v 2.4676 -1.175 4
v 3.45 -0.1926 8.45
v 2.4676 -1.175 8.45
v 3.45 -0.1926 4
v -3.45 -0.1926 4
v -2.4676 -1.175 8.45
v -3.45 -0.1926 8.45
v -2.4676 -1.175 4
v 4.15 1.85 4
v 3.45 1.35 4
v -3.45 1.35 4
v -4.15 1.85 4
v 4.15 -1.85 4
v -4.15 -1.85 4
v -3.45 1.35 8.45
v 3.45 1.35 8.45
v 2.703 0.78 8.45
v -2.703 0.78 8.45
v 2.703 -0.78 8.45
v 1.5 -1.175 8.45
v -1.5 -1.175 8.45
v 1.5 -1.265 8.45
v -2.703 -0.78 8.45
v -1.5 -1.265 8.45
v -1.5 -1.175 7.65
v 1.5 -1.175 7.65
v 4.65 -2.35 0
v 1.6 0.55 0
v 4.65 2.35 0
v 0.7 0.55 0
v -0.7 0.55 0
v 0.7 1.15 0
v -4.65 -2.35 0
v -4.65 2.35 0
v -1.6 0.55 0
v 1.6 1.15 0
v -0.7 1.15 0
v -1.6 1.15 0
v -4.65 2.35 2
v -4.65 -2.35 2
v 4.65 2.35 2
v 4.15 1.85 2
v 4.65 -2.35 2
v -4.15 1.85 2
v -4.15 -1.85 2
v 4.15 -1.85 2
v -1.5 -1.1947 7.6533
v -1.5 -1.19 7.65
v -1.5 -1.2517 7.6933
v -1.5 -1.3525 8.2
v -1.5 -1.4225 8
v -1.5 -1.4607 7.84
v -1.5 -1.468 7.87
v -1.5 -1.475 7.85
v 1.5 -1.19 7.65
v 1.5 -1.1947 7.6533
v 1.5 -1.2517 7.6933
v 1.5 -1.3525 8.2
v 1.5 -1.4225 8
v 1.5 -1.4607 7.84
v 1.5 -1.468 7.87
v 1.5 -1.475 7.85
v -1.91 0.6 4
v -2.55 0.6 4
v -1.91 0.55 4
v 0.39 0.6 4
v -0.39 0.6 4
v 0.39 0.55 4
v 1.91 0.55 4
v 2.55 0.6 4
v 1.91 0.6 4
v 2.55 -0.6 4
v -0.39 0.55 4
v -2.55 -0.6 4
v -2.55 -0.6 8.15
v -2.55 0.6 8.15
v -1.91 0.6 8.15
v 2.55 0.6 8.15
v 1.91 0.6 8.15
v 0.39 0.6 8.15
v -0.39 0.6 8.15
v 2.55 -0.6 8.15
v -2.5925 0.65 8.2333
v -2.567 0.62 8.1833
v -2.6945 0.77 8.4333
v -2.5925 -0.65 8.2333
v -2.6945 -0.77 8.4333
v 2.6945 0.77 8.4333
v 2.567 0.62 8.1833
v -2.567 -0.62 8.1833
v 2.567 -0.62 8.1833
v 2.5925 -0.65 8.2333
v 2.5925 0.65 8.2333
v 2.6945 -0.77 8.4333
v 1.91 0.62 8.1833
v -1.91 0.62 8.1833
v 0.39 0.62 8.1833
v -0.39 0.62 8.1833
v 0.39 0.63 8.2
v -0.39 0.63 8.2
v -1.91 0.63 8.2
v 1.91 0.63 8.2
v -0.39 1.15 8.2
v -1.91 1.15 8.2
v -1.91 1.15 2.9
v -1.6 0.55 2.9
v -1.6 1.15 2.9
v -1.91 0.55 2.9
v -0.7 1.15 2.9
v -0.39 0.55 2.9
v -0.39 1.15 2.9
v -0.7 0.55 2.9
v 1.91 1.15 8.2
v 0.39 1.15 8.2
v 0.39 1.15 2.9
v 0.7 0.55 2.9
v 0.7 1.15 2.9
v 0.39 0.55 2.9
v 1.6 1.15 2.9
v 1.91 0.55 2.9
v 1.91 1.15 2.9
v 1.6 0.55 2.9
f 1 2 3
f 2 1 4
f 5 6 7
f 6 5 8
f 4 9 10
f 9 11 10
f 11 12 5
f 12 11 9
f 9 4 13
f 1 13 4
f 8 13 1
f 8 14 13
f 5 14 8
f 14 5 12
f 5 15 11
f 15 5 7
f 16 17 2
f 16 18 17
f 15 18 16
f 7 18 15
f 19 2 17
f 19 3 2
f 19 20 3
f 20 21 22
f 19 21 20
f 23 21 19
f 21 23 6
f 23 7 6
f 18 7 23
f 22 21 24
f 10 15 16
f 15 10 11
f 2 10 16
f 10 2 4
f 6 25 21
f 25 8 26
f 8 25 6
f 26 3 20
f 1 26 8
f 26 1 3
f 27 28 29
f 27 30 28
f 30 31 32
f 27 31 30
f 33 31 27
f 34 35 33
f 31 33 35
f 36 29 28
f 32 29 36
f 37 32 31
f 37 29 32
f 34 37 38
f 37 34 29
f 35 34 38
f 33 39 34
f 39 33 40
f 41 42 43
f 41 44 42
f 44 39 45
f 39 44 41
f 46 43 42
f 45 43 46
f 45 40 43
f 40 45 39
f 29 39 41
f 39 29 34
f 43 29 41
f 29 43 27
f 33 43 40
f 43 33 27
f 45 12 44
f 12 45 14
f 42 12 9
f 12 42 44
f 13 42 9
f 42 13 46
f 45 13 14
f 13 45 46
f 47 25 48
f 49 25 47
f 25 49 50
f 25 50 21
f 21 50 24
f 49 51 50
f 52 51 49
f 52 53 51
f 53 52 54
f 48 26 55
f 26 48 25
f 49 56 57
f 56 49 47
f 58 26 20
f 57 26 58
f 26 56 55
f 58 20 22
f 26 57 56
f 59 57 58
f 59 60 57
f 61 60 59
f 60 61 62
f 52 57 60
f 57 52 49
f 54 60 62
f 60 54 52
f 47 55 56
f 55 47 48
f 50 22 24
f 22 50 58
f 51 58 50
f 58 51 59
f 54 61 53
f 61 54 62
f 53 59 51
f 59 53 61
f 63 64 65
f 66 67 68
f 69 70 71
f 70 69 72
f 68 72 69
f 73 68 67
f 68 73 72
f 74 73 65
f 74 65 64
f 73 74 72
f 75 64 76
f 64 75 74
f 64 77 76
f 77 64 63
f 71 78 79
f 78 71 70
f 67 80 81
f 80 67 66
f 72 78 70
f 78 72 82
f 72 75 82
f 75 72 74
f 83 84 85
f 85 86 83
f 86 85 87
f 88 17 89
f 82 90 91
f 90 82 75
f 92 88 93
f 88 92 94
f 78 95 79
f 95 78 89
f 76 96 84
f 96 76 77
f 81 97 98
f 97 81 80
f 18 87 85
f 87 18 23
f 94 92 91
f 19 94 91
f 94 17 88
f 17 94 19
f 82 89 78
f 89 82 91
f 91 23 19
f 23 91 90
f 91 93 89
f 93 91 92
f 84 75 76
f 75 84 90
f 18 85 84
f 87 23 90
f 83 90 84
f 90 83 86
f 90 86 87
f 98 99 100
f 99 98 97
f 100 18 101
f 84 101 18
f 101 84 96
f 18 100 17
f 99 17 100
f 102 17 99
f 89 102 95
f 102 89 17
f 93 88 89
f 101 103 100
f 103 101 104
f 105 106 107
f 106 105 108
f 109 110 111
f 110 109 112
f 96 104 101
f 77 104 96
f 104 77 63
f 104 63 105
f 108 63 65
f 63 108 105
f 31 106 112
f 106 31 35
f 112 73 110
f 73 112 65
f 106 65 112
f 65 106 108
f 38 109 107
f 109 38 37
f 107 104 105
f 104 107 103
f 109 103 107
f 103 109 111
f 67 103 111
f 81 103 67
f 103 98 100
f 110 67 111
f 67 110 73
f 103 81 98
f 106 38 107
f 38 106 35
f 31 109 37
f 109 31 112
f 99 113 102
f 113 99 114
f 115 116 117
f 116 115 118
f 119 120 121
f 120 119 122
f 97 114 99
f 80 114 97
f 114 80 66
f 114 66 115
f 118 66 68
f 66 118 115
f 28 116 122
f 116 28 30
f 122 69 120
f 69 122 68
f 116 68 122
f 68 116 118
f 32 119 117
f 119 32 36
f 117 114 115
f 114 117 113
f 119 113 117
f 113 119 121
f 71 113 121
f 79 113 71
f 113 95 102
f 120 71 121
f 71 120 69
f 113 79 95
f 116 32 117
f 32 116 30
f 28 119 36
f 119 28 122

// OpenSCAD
variant = 1; // [0:Official - UNSUPPORTED,1:TO220 leads,2:PCB]

$fn = 60;

module TO220_lead() {
    translate([0,0,-5.2]) linear_extrude(5.2) square([1.42,0.5], center=true);
    translate([0,0,-13]) linear_extrude(13) square([0.8,0.5], center=true);
}

module connector(burried = 3, variant = variant) {
    pcb = (variant == 2);

    //translate([0,0.1,0]) %linear_extrude(4.45) square([6.9,2.55], center=true);
    difference() {
        union() {
            linear_extrude(burried-1) square([8.3,3.7]+[1,1], center=true);
            linear_extrude(burried+1) square([8.3,3.7], center=true);

            translate([0,0,burried+1]) intersection() {
                linear_extrude(4.45) square([6.9,2.7], center=true);
                for (a=[-1,1])
                    translate([0,.6,0]) rotate([0,0,a*45]) cube([6,6,10], center=true);
                translate([0,0.1,0]) union() {
                    cube([10,2.55,10], center=true);
                }
            }
                    translate([0,0.1-2.55/2,burried+1+4.45-0.8]) linear_extrude(0.2, scale=[1,20]) square([3,0.3/10], center=true);
                    translate([0,0.1-2.55/2,burried+1+4.45-0.8+0.2]) linear_extrude(0.6, scale=[1,0.3]) square([3,0.3*2], center=true);
                    //linear_extrude(0.8)
                        // 3,0.3*2,.8
        }
        translate([0,0,burried+1]) {
            linear_extrude(5) square([5.1,1.2], center=true);
            translate([0,0,4.15]) linear_extrude(1, scale=[6/5,2/1]) square([5.1,1.2], center=true);
        }
        if (variant == 2) {
            translate([0,0.95,0]) cube([6,.9,(5+burried)*3], center=true);
            translate([0,0,burried-2]) rotate([90,0,0]) cylinder(d=1.75+0.2, h=30, center=true);
        }
        if (variant == 1) {
            for (dx=[-1,1])
                translate([dx*(1+1.3)/2,1.2/2+.5/2,burried+1+4.45-0.3]) minkowski() {
                    TO220_lead();
                    cube(.1, center=true);
                }
        }
            // contact 1.4 with .8 in between
            // pitch ~= 2.2
        if ($preview) cube(100);
    }
    if ($preview) {
        if (variant == 2)
            color("green", 0.5) translate([0,0.95,(5+burried)/2]) cube([6,.8,(5+1+burried)], center=true);
        if (variant == 1)
            for (dx=[-1,1])
                translate([dx*(1+1.3)/2,1.2/2+.5/2,burried+1+4.45-0.3]) color("gold") TO220_lead();
    }
}

connector();
